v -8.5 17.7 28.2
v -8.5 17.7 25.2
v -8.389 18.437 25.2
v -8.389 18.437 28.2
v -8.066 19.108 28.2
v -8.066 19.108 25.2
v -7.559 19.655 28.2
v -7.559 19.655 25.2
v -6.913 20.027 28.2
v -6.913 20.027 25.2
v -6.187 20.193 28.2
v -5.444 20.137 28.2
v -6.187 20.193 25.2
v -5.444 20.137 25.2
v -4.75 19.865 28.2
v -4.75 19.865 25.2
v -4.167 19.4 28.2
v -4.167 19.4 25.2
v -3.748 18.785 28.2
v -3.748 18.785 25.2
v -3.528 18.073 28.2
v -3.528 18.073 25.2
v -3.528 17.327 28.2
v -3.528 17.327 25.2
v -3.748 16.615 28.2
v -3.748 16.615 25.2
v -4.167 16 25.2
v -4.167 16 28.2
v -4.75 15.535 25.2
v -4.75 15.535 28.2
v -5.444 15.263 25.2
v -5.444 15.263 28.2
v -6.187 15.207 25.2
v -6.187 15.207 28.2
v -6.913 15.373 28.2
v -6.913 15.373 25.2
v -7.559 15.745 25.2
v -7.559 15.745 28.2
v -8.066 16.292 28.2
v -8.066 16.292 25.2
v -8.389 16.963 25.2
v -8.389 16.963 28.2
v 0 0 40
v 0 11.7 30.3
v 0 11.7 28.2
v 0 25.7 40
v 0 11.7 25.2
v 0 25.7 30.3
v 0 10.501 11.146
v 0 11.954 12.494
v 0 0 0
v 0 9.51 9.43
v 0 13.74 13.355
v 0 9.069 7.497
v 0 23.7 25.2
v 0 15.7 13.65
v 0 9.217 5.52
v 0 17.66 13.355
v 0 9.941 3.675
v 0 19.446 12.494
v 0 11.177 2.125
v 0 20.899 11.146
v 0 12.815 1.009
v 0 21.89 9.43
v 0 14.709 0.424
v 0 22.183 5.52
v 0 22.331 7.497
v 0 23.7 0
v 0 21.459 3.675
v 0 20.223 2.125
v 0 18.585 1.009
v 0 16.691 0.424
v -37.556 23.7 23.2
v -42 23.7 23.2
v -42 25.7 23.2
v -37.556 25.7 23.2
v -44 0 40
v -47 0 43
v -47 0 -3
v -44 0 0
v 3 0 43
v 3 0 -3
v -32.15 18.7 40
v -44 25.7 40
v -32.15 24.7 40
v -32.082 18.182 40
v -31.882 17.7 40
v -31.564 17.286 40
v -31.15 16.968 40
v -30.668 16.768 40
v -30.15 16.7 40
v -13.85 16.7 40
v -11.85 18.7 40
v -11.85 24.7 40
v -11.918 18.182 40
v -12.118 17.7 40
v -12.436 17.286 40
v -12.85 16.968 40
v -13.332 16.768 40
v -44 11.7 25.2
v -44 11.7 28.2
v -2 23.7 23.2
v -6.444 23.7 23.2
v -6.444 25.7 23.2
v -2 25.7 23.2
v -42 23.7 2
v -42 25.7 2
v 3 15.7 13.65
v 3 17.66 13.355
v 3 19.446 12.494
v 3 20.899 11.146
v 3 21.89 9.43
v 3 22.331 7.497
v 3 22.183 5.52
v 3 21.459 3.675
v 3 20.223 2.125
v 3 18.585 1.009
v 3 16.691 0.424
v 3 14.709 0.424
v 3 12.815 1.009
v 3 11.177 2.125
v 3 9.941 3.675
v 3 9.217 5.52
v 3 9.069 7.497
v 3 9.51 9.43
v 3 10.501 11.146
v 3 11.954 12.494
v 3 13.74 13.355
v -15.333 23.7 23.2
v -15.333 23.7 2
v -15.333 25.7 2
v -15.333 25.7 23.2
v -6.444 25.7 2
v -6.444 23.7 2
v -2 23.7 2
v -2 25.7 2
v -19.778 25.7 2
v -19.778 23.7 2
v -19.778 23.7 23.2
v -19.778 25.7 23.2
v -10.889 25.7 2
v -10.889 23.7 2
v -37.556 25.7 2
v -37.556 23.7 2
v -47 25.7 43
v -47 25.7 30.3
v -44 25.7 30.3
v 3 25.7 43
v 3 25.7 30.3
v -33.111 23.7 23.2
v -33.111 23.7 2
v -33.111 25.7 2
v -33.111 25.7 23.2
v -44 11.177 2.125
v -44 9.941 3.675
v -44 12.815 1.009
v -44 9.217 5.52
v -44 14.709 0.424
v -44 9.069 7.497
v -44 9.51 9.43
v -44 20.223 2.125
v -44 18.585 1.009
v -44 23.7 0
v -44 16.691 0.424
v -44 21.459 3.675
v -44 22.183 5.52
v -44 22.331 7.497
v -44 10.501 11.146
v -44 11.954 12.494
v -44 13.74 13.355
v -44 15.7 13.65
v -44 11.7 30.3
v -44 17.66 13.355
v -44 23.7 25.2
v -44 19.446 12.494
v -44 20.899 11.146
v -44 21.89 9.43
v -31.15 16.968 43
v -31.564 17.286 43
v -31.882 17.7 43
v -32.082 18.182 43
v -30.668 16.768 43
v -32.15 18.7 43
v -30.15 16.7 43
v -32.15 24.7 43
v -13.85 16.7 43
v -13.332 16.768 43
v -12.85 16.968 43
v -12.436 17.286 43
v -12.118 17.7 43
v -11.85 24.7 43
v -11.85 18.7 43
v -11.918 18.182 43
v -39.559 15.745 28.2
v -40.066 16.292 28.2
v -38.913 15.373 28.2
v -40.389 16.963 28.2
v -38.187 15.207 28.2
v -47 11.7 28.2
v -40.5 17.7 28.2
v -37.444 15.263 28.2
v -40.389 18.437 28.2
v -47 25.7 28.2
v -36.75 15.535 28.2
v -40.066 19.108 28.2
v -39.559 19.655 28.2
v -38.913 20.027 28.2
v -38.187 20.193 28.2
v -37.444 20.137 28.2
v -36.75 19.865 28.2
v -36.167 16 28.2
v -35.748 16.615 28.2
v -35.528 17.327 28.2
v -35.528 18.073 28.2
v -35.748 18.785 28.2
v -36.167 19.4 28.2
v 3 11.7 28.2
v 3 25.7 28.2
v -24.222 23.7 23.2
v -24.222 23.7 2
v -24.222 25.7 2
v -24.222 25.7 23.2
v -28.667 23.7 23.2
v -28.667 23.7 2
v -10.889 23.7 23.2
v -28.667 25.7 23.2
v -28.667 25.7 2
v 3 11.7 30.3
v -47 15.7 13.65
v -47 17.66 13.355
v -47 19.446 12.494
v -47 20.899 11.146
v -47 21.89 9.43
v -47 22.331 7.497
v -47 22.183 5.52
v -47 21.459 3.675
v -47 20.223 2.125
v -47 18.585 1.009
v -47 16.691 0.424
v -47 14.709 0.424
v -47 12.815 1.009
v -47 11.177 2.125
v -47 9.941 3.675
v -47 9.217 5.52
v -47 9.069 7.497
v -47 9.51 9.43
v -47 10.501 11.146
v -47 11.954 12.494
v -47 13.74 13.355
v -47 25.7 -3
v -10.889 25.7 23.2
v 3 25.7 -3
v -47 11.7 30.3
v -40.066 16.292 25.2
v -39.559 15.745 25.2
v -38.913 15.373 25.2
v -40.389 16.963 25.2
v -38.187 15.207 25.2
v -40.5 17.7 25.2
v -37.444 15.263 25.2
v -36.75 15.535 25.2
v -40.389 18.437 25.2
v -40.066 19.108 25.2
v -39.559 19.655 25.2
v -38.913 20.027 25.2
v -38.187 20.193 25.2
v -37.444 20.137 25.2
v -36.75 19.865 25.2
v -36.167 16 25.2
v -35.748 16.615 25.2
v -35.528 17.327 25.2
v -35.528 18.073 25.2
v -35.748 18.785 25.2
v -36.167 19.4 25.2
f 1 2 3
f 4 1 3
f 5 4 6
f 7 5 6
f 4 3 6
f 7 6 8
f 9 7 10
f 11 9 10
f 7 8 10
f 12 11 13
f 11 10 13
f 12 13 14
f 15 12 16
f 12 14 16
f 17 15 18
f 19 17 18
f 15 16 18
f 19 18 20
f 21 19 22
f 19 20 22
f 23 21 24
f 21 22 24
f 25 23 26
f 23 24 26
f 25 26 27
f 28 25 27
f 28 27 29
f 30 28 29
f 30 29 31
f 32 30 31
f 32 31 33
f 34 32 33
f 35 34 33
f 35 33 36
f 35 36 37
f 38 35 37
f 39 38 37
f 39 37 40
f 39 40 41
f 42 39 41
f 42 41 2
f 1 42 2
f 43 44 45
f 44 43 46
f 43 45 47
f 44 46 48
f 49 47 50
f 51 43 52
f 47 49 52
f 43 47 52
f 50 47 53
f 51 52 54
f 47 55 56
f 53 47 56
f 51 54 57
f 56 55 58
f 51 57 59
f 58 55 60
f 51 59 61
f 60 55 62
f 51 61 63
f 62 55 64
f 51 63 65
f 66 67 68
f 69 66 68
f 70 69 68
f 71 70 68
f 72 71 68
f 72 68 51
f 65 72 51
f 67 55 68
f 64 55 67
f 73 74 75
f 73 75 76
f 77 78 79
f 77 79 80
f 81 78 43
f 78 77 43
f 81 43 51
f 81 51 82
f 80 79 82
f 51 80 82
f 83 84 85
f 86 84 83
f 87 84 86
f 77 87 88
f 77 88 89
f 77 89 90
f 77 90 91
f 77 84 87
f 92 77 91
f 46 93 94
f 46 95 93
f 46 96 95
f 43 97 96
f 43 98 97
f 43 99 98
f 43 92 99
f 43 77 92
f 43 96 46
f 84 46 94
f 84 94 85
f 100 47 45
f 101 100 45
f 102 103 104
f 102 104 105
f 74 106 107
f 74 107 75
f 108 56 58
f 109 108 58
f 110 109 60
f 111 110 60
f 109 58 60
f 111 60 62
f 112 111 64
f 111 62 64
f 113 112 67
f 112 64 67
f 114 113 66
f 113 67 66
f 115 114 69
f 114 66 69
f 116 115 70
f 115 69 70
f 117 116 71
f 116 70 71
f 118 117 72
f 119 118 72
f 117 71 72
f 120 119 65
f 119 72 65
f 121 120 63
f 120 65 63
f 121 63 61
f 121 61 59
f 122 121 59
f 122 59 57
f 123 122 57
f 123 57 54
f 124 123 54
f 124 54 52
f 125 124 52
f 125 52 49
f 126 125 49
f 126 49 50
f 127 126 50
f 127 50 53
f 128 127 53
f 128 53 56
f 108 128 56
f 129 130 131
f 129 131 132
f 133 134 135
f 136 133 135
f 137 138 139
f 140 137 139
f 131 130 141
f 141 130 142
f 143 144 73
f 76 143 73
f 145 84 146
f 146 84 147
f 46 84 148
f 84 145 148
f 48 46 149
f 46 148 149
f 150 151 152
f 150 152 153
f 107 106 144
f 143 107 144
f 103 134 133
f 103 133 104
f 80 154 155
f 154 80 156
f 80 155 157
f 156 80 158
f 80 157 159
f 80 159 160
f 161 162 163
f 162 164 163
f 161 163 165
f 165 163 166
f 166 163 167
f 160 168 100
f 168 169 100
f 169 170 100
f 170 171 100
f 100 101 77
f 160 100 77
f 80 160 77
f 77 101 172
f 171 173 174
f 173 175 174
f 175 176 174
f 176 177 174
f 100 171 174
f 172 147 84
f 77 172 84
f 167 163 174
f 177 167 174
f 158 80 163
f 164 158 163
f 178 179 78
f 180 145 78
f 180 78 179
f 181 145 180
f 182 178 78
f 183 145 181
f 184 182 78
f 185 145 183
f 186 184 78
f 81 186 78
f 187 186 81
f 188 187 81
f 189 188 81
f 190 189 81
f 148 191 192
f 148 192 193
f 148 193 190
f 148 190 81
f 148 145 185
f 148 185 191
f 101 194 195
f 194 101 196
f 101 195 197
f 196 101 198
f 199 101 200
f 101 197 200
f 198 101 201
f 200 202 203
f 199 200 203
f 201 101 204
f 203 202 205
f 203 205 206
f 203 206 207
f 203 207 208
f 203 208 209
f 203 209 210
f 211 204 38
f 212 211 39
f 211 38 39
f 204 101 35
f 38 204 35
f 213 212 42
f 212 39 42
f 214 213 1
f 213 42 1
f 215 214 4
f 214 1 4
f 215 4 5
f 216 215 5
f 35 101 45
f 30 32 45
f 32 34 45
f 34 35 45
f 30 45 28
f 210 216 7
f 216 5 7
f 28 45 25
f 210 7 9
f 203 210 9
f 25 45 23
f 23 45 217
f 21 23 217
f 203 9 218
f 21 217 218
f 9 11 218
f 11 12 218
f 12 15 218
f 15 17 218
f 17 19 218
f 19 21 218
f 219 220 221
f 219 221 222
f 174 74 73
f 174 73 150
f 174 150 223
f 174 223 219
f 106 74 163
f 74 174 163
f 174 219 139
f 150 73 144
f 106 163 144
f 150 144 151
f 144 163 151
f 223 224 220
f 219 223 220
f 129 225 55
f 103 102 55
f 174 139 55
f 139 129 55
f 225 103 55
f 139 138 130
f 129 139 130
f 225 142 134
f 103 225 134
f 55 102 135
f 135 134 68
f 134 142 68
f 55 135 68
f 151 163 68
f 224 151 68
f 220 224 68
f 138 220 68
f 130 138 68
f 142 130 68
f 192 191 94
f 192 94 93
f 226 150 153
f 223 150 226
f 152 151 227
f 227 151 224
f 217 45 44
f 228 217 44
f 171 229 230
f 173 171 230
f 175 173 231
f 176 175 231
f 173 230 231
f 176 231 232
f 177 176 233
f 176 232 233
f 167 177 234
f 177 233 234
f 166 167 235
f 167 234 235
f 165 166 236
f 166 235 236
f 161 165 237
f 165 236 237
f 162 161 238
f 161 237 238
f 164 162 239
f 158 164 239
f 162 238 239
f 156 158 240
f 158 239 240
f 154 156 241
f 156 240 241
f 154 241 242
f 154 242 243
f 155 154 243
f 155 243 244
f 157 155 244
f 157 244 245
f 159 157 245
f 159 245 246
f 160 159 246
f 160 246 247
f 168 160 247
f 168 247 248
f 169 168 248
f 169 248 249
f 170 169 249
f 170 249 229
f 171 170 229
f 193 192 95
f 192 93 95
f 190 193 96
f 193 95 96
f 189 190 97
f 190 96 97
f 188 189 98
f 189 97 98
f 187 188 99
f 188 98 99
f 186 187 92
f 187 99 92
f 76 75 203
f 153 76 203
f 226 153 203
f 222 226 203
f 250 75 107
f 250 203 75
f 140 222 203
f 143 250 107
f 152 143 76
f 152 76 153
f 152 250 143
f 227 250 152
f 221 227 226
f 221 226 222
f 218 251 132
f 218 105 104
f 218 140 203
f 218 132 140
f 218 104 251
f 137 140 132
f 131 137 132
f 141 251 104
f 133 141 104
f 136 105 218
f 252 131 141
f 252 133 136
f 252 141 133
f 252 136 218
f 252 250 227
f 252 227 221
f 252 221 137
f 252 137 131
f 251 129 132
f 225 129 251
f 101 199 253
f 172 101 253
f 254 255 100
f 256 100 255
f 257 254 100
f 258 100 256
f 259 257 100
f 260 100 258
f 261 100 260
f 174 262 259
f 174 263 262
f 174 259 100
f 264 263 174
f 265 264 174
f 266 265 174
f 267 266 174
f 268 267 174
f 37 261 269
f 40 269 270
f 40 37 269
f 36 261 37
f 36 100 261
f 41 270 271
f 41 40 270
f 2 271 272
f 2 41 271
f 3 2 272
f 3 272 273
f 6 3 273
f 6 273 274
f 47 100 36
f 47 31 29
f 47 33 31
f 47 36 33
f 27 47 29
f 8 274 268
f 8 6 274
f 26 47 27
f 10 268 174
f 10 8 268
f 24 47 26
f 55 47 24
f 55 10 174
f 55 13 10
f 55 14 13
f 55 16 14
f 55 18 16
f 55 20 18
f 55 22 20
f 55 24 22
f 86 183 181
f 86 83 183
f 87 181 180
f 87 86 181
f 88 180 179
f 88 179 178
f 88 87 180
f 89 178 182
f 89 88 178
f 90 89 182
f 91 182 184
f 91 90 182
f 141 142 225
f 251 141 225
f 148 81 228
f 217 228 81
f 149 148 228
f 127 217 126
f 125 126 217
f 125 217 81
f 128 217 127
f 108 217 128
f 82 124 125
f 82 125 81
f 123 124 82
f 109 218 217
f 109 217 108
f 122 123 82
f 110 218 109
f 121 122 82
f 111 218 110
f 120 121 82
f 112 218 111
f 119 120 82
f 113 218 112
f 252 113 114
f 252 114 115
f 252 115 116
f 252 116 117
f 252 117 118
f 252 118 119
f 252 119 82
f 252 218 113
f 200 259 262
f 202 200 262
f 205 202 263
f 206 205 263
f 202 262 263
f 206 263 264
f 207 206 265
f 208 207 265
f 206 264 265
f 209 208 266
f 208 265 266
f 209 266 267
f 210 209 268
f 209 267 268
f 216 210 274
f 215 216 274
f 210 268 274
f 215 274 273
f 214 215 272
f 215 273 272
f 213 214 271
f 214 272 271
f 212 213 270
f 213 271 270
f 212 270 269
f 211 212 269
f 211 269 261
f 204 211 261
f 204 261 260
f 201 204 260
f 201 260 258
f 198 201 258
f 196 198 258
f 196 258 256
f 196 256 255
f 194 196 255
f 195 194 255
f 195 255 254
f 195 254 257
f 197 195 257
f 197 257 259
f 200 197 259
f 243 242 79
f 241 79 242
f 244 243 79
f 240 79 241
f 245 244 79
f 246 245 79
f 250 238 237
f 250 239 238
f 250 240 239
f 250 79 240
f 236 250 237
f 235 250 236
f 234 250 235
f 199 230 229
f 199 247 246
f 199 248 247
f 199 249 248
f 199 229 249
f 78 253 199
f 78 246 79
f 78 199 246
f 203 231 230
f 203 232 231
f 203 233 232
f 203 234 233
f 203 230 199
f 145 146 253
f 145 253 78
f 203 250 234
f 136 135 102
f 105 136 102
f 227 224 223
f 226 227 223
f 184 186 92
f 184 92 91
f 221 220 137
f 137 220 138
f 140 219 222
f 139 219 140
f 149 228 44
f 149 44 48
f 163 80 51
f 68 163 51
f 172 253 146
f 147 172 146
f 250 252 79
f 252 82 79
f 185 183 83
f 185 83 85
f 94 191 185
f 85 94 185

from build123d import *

# Parameters (mm, degrees)
CROQUIS1_W              = 50
CROQUIS1_H              = 46
CROQUIS1_W_2            = 44
CROQUIS1_H_2            = 40
SALIENTE_EXTRUIR1_DEPTH = 15
CROQUIS4_W              = 44
CROQUIS4_H              = 3
SALIENTE_EXTRUIR3_DEPTH = 10.7
CORTAR_EXTRUIR1_REACH   = 72.608
CROQUIS7_W              = 3
CROQUIS7_H              = 10.7
SALIENTE_EXTRUIR4_DEPTH = 10.7
SALIENTE_EXTRUIR5_DEPTH = 10.7
CORTAR_EXTRUIR2_REACH   = 72.778
CROQUIS9_R              = 6.65
CORTAR_EXTRUIR3_REACH   = 70.691
CROQUIS10_R             = 6.65
CROQUIS11_W             = 50
CROQUIS11_H             = 31.2
SALIENTE_EXTRUIR6_DEPTH = 2
CROQUIS12_W             = 3
CROQUIS12_H             = 12
SALIENTE_EXTRUIR7_DEPTH = 44
CORTAR_EXTRUIR4_REACH   = 62.537
CROQUIS13_R             = 2.5
REDONDEO1_R             = 2
CROQUIS15_W             = 2
CROQUIS15_H             = 10.7
SALIENTE_EXTRUIR8_DEPTH = 3
CROQUIS16_W             = 2.1
CROQUIS16_H             = 3.3
CORTAR_EXTRUIR5_DEPTH   = 50
CROQUIS17_W             = 2
CROQUIS17_H             = 10.7
SALIENTE_EXTRUIR9_DEPTH = 3
CORTAR_EXTRUIR6_REACH   = 69.968
CROQUIS18_W             = 4.444444444
CROQUIS18_H             = 21.2


with BuildPart() as part:
    # Croquis1 → Saliente-Extruir1 (new body)
    with BuildSketch(Plane(origin=(0, 0, 0), x_dir=(1, 0, 0), z_dir=(0, 1, 0))):
        with Locations((-22, -20)):
            Rectangle(CROQUIS1_W, CROQUIS1_H)
        with Locations((-22, -20)):
            Rectangle(CROQUIS1_W_2, CROQUIS1_H_2, mode=Mode.SUBTRACT)
    extrude(amount=SALIENTE_EXTRUIR1_DEPTH)

    # Croquis4 → Saliente-Extruir3 (add)
    with BuildSketch(Plane(origin=(0, 15, 0), x_dir=(1, 0, 0), z_dir=(0, 1, 0))):
        with Locations((-22, -41.5)):
            Rectangle(CROQUIS4_W, CROQUIS4_H)
    extrude(amount=SALIENTE_EXTRUIR3_DEPTH)

    # Croquis6 → Cortar-Extruir1 (cut, up to next)
    with BuildSketch(Plane.XY.offset(43), mode=Mode.PRIVATE) as cortar_extruir1_sk1:
        Polygon((-22, 24.7), (-11.85, 24.7), (-11.85, 16.7), (-32.15, 16.7), (-32.15, 24.7), align=None)
    cortar_extruir1_tool1 = extrude(cortar_extruir1_sk1.sketch, amount=-CORTAR_EXTRUIR1_REACH, mode=Mode.PRIVATE) & part.part
    add(cortar_extruir1_tool1.solids().sort_by_distance((-22, 20.7, 43))[0], mode=Mode.SUBTRACT)

    # Croquis7 → Saliente-Extruir4 (add)
    with BuildSketch(Plane.XY.offset(43)):
        with Locations((-45.5, 20.35)):
            Rectangle(CROQUIS7_W, CROQUIS7_H)
        with Locations((1.5, 20.35)):
            Rectangle(CROQUIS7_W, CROQUIS7_H)
    extrude(amount=-SALIENTE_EXTRUIR4_DEPTH)

    # Croquis8 → Saliente-Extruir5 (add)
    with BuildSketch(Plane(origin=(0, 15, 0), x_dir=(1, 0, 0), z_dir=(0, 1, 0))):
        Polygon((-47, -28.2), (-44, -28.2), (-44, 0), (0, 0), (0, -28.2), (3, -28.2), (3, 3), (-47, 3), align=None)
    extrude(amount=SALIENTE_EXTRUIR5_DEPTH)

    # Croquis9 → Cortar-Extruir2 (cut, up to next)
    with BuildSketch(Plane.ZY.offset(47), mode=Mode.PRIVATE) as cortar_extruir2_sk1:
        with Locations((7, 15.7)):
            Circle(CROQUIS9_R)
    cortar_extruir2_tool1 = extrude(cortar_extruir2_sk1.sketch, amount=-CORTAR_EXTRUIR2_REACH, mode=Mode.PRIVATE) & part.part
    add(cortar_extruir2_tool1.solids().sort_by_distance((-47, 15.7, 7))[0], mode=Mode.SUBTRACT)

    # Croquis10 → Cortar-Extruir3 (cut, up to next)
    with BuildSketch(Plane.ZY, mode=Mode.PRIVATE) as cortar_extruir3_sk1:
        with Locations((7, 15.7)):
            Circle(CROQUIS10_R)
    cortar_extruir3_tool1 = extrude(cortar_extruir3_sk1.sketch, amount=-CORTAR_EXTRUIR3_REACH, mode=Mode.PRIVATE) & part.part
    add(cortar_extruir3_tool1.solids().sort_by_distance((0, 15.7, 7))[0], mode=Mode.SUBTRACT)

    # Croquis11 → Saliente-Extruir6 (add)
    with BuildSketch(Plane(origin=(0, 25.7, 0), x_dir=(1, 0, 0), z_dir=(0, 1, 0))):
        with Locations((-22, -12.6)):
            Rectangle(CROQUIS11_W, CROQUIS11_H)
    extrude(amount=-SALIENTE_EXTRUIR6_DEPTH)

    # Croquis12 → Saliente-Extruir7 (add)
    with BuildSketch(Plane.ZY):
        with Locations((26.7, 17.7)):
            Rectangle(CROQUIS12_W, CROQUIS12_H)
    extrude(amount=SALIENTE_EXTRUIR7_DEPTH)

    # Croquis13 → Cortar-Extruir4 (cut, up to next)
    with BuildSketch(Plane(origin=(0, 0, 25.2), x_dir=(-1, 0, 0), z_dir=(0, 0, -1)), mode=Mode.PRIVATE) as cortar_extruir4_sk1:
        with Locations((6, 17.7)):
            Circle(CROQUIS13_R)
    cortar_extruir4_tool1 = extrude(cortar_extruir4_sk1.sketch, amount=-CORTAR_EXTRUIR4_REACH, mode=Mode.PRIVATE) & part.part
    # Croquis13 → Cortar-Extruir4 (cut, up to next)
    with BuildSketch(Plane(origin=(0, 0, 25.2), x_dir=(-1, 0, 0), z_dir=(0, 0, -1)), mode=Mode.PRIVATE) as cortar_extruir4_sk2:
        with Locations((38, 17.7)):
            Circle(CROQUIS13_R)
    cortar_extruir4_tool2 = extrude(cortar_extruir4_sk2.sketch, amount=-CORTAR_EXTRUIR4_REACH, mode=Mode.PRIVATE) & part.part
    add(cortar_extruir4_tool1.solids().sort_by_distance((-6, 17.7, 25.2))[0], mode=Mode.SUBTRACT)
    add(cortar_extruir4_tool2.solids().sort_by_distance((-38, 17.7, 25.2))[0], mode=Mode.SUBTRACT)

    # Redondeo1
    redondeo1_edges = [part.edges().sort_by_distance(p)[0] for p in [
        (-11.85, 16.7, 41.5),
        (-32.15, 16.7, 41.5),
    ]]
    fillet(redondeo1_edges, radius=REDONDEO1_R)

    # Croquis15 → Saliente-Extruir8 (add)
    with BuildSketch(Plane.ZY.offset(47)):
        with Locations((31.3, 20.35)):
            Rectangle(CROQUIS15_W, CROQUIS15_H)
    extrude(amount=-SALIENTE_EXTRUIR8_DEPTH)

    # Croquis16 → Cortar-Extruir5 (cut)
    with BuildSketch(Plane.ZY.offset(47)):
        with Locations((29.25, 13.35)):
            Rectangle(CROQUIS16_W, CROQUIS16_H)
    extrude(amount=-CORTAR_EXTRUIR5_DEPTH, mode=Mode.SUBTRACT)

    # Croquis17 → Saliente-Extruir9 (add)
    with BuildSketch(Plane(origin=(3, 0, 0), x_dir=(0, 0, -1), z_dir=(1, 0, 0))):
        with Locations((-31.3, 20.35)):
            Rectangle(CROQUIS17_W, CROQUIS17_H)
    extrude(amount=-SALIENTE_EXTRUIR9_DEPTH)

    # Croquis18 → Cortar-Extruir6 (cut, up to next)
    with BuildSketch(Plane.XZ.offset(-23.7), mode=Mode.PRIVATE) as cortar_extruir6_sk1:
        with Locations((-39.777777778, 12.6)):
            Rectangle(CROQUIS18_W, CROQUIS18_H)
    cortar_extruir6_tool1 = extrude(cortar_extruir6_sk1.sketch, amount=-CORTAR_EXTRUIR6_REACH, mode=Mode.PRIVATE) & part.part
    # Croquis18 → Cortar-Extruir6 (cut, up to next)
    with BuildSketch(Plane.XZ.offset(-23.7), mode=Mode.PRIVATE) as cortar_extruir6_sk2:
        with Locations((-30.888888889, 12.6)):
            Rectangle(CROQUIS18_W, CROQUIS18_H)
    cortar_extruir6_tool2 = extrude(cortar_extruir6_sk2.sketch, amount=-CORTAR_EXTRUIR6_REACH, mode=Mode.PRIVATE) & part.part
    # Croquis18 → Cortar-Extruir6 (cut, up to next)
    with BuildSketch(Plane.XZ.offset(-23.7), mode=Mode.PRIVATE) as cortar_extruir6_sk3:
        with Locations((-22, 12.6)):
            Rectangle(CROQUIS18_W, CROQUIS18_H)
    cortar_extruir6_tool3 = extrude(cortar_extruir6_sk3.sketch, amount=-CORTAR_EXTRUIR6_REACH, mode=Mode.PRIVATE) & part.part
    # Croquis18 → Cortar-Extruir6 (cut, up to next)
    with BuildSketch(Plane.XZ.offset(-23.7), mode=Mode.PRIVATE) as cortar_extruir6_sk4:
        with Locations((-13.111111111, 12.6)):
            Rectangle(CROQUIS18_W, CROQUIS18_H)
    cortar_extruir6_tool4 = extrude(cortar_extruir6_sk4.sketch, amount=-CORTAR_EXTRUIR6_REACH, mode=Mode.PRIVATE) & part.part
    # Croquis18 → Cortar-Extruir6 (cut, up to next)
    with BuildSketch(Plane.XZ.offset(-23.7), mode=Mode.PRIVATE) as cortar_extruir6_sk5:
        with Locations((-4.222222222, 12.6)):
            Rectangle(CROQUIS18_W, CROQUIS18_H)
    cortar_extruir6_tool5 = extrude(cortar_extruir6_sk5.sketch, amount=-CORTAR_EXTRUIR6_REACH, mode=Mode.PRIVATE) & part.part
    add(cortar_extruir6_tool1.solids().sort_by_distance((-39.777778, 23.7, 12.6))[0], mode=Mode.SUBTRACT)
    add(cortar_extruir6_tool2.solids().sort_by_distance((-30.888889, 23.7, 12.6))[0], mode=Mode.SUBTRACT)
    add(cortar_extruir6_tool3.solids().sort_by_distance((-22, 23.7, 12.6))[0], mode=Mode.SUBTRACT)
    add(cortar_extruir6_tool4.solids().sort_by_distance((-13.111111, 23.7, 12.6))[0], mode=Mode.SUBTRACT)
    add(cortar_extruir6_tool5.solids().sort_by_distance((-4.222222, 23.7, 12.6))[0], mode=Mode.SUBTRACT)


solid = part.part
